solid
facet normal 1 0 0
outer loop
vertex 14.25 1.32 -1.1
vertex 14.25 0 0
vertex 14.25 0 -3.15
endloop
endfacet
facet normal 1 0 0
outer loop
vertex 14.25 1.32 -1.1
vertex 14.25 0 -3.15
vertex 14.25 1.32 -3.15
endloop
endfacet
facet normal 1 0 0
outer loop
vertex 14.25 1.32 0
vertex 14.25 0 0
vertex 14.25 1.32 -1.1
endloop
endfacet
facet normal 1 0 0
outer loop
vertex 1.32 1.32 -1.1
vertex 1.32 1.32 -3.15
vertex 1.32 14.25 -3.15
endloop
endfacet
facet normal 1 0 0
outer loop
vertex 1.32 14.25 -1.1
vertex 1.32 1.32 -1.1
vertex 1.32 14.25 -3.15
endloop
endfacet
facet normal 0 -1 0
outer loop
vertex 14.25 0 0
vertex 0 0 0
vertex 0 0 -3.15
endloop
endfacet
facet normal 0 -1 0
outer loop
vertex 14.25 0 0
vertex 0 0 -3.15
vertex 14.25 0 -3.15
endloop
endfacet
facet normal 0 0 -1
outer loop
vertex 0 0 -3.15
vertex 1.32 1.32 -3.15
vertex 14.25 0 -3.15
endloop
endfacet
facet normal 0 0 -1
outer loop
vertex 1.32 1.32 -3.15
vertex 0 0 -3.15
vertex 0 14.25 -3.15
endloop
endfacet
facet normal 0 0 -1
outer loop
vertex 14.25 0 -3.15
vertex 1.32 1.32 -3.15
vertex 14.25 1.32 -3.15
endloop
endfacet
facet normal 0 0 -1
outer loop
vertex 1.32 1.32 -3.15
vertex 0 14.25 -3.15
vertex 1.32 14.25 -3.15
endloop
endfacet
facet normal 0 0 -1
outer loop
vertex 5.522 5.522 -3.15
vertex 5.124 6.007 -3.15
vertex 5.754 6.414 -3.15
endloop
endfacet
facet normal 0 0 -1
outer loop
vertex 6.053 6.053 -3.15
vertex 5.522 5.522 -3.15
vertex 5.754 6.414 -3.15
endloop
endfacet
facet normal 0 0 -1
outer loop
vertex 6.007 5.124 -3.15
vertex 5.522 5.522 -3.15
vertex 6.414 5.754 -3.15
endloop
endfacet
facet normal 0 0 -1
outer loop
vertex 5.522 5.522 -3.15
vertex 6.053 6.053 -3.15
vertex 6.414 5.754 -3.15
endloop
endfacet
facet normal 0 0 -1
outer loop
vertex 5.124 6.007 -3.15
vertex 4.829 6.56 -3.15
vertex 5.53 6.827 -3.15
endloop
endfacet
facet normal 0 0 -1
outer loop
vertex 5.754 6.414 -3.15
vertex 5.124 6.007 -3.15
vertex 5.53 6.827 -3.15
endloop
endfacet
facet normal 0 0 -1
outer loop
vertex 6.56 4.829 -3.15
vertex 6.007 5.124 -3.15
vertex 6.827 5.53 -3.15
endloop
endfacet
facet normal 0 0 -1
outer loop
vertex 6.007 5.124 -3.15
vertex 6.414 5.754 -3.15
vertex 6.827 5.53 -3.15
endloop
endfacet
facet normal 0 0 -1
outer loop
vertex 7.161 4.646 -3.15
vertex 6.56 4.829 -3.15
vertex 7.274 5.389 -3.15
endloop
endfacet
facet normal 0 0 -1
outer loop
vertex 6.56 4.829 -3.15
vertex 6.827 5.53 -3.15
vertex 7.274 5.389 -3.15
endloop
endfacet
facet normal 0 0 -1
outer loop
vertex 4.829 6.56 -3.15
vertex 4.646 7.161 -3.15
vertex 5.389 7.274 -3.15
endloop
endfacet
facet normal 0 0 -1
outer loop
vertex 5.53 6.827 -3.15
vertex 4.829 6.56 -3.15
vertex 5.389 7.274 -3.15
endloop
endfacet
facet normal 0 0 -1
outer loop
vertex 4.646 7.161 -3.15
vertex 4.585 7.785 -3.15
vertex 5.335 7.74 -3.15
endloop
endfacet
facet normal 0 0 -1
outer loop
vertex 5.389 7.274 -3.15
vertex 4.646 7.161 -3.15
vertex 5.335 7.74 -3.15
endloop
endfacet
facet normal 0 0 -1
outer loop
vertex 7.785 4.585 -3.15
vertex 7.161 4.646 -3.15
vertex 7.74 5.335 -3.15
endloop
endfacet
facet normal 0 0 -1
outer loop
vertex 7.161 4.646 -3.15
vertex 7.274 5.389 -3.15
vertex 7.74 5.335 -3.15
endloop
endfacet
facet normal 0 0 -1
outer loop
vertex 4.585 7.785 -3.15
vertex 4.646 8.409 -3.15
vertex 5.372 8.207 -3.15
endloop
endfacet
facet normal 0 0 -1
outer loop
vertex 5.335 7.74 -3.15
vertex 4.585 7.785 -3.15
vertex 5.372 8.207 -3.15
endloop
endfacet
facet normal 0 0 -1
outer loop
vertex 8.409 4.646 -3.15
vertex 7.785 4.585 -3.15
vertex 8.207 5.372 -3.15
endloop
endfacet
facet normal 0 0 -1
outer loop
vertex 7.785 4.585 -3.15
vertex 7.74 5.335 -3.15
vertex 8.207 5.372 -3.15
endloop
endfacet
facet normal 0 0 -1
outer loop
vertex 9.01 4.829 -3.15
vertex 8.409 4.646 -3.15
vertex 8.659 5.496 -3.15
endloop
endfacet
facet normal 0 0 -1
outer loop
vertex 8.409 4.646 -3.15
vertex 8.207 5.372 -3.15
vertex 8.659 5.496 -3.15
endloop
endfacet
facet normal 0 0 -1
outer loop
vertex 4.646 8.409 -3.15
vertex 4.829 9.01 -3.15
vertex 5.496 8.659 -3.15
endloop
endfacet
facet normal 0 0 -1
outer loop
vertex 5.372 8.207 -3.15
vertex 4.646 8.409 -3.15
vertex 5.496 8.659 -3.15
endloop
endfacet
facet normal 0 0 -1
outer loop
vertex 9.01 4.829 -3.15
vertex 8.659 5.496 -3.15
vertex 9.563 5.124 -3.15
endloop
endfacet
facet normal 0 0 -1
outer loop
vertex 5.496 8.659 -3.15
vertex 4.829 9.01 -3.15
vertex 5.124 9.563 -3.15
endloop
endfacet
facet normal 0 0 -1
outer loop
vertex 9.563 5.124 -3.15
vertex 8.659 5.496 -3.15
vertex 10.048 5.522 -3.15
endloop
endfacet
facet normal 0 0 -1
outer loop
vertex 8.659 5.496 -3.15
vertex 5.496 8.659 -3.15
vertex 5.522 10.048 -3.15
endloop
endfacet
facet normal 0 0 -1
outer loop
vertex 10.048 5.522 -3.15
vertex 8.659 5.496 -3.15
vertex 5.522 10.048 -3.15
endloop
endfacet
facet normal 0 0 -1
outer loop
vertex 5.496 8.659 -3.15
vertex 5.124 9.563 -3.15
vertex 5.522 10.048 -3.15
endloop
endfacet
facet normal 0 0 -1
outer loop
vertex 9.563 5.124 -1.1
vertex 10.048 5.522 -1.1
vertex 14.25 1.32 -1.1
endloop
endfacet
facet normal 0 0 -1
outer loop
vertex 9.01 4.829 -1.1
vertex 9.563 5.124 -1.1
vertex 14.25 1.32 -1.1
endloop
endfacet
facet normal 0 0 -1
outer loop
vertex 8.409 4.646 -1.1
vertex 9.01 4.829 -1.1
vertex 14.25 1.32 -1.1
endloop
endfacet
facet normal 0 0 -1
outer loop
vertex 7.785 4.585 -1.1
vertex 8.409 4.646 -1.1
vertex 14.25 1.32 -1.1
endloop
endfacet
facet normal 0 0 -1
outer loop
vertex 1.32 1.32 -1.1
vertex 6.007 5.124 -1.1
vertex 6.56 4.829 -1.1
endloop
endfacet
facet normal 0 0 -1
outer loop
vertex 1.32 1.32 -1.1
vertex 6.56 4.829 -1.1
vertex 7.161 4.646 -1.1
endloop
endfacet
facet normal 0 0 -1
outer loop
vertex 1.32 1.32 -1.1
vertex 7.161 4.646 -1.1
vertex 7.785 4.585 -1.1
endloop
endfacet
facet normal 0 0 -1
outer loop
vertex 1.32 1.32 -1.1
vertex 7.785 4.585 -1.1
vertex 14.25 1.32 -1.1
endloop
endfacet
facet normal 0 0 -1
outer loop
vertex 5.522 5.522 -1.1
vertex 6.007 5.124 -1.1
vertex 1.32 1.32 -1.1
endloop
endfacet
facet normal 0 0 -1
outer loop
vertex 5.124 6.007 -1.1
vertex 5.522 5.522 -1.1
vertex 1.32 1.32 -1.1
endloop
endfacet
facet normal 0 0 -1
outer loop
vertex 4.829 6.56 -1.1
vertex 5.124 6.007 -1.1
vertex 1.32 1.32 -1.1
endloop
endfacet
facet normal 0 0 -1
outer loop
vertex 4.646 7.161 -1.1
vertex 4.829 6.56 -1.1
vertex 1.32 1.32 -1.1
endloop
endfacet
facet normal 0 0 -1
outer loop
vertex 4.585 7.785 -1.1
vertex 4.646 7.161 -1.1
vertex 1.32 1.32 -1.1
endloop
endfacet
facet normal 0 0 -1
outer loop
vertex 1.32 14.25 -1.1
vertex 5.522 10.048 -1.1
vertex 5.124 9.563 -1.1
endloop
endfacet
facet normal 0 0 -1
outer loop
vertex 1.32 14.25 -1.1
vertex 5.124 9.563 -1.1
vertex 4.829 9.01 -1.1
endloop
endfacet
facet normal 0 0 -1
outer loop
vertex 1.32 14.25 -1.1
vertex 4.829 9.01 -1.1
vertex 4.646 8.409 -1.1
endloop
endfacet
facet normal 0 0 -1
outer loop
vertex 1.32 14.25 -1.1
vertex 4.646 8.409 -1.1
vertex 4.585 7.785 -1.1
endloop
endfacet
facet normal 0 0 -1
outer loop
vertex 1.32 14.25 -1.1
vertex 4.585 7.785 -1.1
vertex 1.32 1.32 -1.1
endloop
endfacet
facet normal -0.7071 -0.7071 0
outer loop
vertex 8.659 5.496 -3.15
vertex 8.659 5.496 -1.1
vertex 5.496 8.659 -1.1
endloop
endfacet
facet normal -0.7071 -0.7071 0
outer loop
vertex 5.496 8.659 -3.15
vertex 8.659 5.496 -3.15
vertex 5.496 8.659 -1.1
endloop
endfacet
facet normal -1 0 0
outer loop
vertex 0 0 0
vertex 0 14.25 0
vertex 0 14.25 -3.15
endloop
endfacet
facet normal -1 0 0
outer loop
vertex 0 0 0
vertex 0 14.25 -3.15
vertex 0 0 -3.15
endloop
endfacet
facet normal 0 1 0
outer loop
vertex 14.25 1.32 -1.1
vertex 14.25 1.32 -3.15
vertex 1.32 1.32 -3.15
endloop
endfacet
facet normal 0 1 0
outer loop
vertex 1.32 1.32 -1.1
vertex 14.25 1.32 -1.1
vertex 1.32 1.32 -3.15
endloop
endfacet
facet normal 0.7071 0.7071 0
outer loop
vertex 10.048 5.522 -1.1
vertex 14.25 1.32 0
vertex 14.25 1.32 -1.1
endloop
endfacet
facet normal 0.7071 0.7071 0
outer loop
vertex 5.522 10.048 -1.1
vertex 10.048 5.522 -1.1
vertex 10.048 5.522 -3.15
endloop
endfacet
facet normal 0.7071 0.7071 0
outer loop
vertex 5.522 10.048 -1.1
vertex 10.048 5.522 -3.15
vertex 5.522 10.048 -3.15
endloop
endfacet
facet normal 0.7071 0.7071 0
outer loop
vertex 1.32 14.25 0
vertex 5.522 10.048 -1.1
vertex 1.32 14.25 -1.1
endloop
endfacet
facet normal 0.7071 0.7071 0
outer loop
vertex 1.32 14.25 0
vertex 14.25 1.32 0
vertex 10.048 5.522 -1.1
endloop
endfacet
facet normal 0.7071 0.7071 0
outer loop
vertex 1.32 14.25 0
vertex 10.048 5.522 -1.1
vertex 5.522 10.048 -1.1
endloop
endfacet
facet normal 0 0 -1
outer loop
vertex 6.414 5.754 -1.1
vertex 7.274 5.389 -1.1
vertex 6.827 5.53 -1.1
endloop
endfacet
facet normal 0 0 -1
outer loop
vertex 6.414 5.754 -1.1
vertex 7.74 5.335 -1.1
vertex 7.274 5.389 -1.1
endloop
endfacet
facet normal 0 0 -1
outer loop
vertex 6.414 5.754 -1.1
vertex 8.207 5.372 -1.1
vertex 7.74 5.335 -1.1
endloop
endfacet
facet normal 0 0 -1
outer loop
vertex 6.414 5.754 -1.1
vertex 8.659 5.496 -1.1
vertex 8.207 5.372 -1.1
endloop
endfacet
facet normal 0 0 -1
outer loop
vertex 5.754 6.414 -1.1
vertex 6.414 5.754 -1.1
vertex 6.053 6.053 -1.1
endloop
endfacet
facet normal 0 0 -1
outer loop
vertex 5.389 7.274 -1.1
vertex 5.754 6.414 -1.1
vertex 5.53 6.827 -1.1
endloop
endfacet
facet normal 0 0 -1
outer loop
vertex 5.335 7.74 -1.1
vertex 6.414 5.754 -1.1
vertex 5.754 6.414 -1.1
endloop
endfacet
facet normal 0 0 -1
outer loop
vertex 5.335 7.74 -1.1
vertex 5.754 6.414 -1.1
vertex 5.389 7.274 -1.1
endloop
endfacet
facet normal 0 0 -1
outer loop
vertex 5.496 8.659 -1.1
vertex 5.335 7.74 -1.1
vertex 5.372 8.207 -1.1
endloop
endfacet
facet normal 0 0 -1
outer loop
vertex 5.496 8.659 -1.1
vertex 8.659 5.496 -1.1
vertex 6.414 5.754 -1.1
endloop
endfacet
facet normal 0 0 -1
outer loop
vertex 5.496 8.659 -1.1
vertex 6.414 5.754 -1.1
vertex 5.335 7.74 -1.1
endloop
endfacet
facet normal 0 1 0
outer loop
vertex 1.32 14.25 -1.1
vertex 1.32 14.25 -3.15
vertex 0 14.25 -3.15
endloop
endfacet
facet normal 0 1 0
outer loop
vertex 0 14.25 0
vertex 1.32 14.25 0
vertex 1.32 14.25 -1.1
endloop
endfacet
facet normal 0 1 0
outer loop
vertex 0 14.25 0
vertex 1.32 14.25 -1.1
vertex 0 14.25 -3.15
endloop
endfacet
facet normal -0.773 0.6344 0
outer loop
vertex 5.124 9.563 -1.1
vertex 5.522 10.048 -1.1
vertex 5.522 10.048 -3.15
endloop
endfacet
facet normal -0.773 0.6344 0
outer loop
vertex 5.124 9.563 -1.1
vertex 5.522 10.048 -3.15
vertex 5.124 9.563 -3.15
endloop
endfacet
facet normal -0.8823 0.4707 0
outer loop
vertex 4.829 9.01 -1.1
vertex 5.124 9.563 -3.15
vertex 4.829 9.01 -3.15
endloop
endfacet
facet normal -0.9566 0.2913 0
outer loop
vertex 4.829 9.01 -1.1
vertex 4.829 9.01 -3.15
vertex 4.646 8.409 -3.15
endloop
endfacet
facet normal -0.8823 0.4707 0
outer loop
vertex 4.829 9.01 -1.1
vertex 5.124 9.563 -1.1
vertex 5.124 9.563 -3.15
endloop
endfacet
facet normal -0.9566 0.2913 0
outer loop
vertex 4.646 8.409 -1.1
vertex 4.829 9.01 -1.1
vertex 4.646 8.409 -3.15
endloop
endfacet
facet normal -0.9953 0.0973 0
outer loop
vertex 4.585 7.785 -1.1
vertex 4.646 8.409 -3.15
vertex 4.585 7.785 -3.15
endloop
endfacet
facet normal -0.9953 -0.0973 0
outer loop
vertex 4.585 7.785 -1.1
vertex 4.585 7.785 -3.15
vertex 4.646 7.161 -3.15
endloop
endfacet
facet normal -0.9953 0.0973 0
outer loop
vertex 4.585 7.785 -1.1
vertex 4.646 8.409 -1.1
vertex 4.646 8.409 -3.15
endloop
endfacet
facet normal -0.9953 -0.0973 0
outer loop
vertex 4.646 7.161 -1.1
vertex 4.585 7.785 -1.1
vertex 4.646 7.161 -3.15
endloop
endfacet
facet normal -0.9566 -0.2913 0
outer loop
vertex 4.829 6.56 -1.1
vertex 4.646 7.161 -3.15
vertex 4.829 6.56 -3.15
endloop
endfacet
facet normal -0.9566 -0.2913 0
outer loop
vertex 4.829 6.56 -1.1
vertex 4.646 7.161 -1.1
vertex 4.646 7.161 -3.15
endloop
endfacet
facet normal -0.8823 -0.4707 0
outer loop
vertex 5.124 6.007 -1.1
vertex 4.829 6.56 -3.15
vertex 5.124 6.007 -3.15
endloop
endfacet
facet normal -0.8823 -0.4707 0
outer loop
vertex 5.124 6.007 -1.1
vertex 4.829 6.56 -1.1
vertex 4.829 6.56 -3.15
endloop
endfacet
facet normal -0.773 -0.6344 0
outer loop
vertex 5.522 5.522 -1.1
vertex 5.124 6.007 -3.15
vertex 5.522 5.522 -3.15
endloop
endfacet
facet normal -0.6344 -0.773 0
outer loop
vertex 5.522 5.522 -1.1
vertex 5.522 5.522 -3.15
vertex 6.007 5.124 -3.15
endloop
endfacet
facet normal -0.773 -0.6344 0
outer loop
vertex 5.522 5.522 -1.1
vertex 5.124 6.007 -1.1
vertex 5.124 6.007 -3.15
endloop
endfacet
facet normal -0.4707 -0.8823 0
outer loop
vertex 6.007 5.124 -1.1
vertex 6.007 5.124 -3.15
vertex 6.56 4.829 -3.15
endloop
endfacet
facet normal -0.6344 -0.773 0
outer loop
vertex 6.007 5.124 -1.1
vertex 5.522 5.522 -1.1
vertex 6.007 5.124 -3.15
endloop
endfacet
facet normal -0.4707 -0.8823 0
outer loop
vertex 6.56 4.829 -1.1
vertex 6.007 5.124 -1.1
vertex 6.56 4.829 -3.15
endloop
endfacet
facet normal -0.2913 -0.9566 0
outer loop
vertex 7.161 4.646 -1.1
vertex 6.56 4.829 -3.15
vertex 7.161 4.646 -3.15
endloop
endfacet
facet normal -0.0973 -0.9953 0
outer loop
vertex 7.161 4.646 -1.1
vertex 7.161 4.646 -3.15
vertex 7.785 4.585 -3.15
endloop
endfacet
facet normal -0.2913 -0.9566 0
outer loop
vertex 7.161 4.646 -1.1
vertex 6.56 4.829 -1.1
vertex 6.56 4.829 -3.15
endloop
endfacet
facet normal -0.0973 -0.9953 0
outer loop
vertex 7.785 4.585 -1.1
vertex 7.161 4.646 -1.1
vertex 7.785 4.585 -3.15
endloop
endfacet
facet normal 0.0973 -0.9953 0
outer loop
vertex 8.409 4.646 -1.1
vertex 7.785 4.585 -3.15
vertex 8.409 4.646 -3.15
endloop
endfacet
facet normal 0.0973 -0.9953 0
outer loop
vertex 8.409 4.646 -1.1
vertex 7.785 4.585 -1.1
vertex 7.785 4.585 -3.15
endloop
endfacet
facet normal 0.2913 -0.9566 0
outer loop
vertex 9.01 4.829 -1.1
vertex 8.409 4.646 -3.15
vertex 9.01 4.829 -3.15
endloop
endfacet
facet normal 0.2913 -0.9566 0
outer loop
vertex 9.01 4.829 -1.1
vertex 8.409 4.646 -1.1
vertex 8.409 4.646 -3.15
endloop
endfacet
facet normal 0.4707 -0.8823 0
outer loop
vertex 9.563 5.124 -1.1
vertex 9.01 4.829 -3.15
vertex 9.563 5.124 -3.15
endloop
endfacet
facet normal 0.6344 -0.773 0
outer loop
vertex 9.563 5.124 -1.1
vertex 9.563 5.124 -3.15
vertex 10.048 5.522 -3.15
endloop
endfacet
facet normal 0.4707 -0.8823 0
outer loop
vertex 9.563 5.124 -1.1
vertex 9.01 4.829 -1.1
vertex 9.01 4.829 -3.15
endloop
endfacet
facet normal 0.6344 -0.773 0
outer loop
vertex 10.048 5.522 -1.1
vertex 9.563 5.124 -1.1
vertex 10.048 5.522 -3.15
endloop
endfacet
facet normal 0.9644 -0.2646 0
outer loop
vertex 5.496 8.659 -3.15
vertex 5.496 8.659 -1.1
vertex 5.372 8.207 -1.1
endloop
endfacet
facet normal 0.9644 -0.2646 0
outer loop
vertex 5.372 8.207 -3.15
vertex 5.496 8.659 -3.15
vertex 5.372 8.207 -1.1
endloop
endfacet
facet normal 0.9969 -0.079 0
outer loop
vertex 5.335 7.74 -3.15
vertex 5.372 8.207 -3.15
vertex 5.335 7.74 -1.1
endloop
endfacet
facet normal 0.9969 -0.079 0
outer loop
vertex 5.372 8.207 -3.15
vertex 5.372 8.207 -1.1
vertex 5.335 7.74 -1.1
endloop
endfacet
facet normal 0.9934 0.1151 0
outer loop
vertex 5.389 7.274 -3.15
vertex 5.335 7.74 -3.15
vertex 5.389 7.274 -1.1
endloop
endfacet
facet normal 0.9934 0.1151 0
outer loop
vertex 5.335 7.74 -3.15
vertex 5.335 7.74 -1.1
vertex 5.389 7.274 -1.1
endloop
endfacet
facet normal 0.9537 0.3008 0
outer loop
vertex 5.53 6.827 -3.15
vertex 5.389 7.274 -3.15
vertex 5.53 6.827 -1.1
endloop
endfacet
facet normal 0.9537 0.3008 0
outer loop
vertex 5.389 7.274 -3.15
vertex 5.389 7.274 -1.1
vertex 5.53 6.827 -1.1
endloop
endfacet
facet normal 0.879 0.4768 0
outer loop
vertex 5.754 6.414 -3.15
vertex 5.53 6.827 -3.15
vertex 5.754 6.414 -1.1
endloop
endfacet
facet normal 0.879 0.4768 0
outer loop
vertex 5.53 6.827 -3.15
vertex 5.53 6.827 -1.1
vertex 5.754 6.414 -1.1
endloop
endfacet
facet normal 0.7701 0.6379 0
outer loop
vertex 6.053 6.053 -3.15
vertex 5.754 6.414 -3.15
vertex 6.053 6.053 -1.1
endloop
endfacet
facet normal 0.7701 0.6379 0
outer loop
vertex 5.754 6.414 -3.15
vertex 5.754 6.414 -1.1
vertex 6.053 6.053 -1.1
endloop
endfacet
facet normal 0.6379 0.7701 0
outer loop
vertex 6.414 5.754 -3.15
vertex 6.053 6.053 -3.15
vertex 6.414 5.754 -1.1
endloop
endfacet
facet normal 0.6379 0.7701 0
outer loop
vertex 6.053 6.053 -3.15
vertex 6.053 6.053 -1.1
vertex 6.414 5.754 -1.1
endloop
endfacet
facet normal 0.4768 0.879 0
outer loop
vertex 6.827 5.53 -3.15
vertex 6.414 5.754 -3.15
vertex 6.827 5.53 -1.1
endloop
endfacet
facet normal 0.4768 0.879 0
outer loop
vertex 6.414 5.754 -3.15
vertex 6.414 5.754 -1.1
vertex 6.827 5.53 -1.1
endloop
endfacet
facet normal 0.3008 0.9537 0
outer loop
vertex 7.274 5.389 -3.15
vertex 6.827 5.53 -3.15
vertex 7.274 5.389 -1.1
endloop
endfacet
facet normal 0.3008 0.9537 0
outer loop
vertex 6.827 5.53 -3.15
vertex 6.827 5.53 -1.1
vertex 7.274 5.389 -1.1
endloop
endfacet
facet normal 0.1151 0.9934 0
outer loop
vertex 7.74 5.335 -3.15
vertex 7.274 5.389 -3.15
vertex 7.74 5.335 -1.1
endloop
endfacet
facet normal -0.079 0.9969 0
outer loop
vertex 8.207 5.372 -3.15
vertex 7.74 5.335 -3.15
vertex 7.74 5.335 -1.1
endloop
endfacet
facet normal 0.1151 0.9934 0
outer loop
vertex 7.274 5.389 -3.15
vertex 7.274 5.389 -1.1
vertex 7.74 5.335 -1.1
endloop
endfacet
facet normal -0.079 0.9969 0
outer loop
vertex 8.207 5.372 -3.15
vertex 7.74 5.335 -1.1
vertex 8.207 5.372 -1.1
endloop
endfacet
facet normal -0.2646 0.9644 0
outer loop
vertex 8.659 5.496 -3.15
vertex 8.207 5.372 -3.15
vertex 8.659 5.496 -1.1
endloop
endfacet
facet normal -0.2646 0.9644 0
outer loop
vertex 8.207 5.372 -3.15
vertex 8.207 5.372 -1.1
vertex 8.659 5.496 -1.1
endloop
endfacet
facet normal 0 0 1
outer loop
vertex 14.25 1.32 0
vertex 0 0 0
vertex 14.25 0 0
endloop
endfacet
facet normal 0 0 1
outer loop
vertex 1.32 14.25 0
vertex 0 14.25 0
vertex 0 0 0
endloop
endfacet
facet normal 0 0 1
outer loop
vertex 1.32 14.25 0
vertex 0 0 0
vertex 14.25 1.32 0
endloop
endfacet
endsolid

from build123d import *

# Parameters (mm, degrees)
BOSS_EXTRUDE1_DEPTH = 3.15
CUT_EXTRUDE1_DEPTH  = 2.05
BOSS_EXTRUDE2_DEPTH = 2.05


with BuildPart() as part:
    # Sketch1 → Boss-Extrude1 (new body)
    with BuildSketch(Plane.XY):
        Polygon((0, 0), (14.25, 0), (14.25, 1.32), (1.32, 14.25), (0, 14.25), align=None)
    extrude(amount=-BOSS_EXTRUDE1_DEPTH)

    # Sketch2 → Cut-Extrude1 (cut)
    with BuildSketch(Plane(origin=(0, 0, -3.15), x_dir=(-1, 0, 0), z_dir=(0, 0, -1))):
        Polygon((-14.25, 1.32), (-1.32, 1.32), (-1.32, 14.25), align=None)
    extrude(amount=-CUT_EXTRUDE1_DEPTH, mode=Mode.SUBTRACT)

    # Sketch3 → Boss-Extrude2 (add)
    with BuildSketch(Plane(origin=(0, 0, -1.1), x_dir=(-1, 0, 0), z_dir=(0, 0, -1))):
        with BuildLine():
            Line((-10.0477417, 5.5222583), (-5.5222583, 10.0477417))
            ThreePointArc((-5.5222583, 10.0477417), (-5.5222583, 5.5222583), (-10.0477417, 5.5222583))
        make_face()
        with BuildLine():
            Line((-8.659427284, 5.496359153), (-5.496359153, 8.659427284))
            ThreePointArc((-5.496359153, 8.659427284), (-6.052588386, 6.052588386), (-8.659427284, 5.496359153))
        make_face(mode=Mode.SUBTRACT)
    extrude(amount=BOSS_EXTRUDE2_DEPTH)


solid = part.part
